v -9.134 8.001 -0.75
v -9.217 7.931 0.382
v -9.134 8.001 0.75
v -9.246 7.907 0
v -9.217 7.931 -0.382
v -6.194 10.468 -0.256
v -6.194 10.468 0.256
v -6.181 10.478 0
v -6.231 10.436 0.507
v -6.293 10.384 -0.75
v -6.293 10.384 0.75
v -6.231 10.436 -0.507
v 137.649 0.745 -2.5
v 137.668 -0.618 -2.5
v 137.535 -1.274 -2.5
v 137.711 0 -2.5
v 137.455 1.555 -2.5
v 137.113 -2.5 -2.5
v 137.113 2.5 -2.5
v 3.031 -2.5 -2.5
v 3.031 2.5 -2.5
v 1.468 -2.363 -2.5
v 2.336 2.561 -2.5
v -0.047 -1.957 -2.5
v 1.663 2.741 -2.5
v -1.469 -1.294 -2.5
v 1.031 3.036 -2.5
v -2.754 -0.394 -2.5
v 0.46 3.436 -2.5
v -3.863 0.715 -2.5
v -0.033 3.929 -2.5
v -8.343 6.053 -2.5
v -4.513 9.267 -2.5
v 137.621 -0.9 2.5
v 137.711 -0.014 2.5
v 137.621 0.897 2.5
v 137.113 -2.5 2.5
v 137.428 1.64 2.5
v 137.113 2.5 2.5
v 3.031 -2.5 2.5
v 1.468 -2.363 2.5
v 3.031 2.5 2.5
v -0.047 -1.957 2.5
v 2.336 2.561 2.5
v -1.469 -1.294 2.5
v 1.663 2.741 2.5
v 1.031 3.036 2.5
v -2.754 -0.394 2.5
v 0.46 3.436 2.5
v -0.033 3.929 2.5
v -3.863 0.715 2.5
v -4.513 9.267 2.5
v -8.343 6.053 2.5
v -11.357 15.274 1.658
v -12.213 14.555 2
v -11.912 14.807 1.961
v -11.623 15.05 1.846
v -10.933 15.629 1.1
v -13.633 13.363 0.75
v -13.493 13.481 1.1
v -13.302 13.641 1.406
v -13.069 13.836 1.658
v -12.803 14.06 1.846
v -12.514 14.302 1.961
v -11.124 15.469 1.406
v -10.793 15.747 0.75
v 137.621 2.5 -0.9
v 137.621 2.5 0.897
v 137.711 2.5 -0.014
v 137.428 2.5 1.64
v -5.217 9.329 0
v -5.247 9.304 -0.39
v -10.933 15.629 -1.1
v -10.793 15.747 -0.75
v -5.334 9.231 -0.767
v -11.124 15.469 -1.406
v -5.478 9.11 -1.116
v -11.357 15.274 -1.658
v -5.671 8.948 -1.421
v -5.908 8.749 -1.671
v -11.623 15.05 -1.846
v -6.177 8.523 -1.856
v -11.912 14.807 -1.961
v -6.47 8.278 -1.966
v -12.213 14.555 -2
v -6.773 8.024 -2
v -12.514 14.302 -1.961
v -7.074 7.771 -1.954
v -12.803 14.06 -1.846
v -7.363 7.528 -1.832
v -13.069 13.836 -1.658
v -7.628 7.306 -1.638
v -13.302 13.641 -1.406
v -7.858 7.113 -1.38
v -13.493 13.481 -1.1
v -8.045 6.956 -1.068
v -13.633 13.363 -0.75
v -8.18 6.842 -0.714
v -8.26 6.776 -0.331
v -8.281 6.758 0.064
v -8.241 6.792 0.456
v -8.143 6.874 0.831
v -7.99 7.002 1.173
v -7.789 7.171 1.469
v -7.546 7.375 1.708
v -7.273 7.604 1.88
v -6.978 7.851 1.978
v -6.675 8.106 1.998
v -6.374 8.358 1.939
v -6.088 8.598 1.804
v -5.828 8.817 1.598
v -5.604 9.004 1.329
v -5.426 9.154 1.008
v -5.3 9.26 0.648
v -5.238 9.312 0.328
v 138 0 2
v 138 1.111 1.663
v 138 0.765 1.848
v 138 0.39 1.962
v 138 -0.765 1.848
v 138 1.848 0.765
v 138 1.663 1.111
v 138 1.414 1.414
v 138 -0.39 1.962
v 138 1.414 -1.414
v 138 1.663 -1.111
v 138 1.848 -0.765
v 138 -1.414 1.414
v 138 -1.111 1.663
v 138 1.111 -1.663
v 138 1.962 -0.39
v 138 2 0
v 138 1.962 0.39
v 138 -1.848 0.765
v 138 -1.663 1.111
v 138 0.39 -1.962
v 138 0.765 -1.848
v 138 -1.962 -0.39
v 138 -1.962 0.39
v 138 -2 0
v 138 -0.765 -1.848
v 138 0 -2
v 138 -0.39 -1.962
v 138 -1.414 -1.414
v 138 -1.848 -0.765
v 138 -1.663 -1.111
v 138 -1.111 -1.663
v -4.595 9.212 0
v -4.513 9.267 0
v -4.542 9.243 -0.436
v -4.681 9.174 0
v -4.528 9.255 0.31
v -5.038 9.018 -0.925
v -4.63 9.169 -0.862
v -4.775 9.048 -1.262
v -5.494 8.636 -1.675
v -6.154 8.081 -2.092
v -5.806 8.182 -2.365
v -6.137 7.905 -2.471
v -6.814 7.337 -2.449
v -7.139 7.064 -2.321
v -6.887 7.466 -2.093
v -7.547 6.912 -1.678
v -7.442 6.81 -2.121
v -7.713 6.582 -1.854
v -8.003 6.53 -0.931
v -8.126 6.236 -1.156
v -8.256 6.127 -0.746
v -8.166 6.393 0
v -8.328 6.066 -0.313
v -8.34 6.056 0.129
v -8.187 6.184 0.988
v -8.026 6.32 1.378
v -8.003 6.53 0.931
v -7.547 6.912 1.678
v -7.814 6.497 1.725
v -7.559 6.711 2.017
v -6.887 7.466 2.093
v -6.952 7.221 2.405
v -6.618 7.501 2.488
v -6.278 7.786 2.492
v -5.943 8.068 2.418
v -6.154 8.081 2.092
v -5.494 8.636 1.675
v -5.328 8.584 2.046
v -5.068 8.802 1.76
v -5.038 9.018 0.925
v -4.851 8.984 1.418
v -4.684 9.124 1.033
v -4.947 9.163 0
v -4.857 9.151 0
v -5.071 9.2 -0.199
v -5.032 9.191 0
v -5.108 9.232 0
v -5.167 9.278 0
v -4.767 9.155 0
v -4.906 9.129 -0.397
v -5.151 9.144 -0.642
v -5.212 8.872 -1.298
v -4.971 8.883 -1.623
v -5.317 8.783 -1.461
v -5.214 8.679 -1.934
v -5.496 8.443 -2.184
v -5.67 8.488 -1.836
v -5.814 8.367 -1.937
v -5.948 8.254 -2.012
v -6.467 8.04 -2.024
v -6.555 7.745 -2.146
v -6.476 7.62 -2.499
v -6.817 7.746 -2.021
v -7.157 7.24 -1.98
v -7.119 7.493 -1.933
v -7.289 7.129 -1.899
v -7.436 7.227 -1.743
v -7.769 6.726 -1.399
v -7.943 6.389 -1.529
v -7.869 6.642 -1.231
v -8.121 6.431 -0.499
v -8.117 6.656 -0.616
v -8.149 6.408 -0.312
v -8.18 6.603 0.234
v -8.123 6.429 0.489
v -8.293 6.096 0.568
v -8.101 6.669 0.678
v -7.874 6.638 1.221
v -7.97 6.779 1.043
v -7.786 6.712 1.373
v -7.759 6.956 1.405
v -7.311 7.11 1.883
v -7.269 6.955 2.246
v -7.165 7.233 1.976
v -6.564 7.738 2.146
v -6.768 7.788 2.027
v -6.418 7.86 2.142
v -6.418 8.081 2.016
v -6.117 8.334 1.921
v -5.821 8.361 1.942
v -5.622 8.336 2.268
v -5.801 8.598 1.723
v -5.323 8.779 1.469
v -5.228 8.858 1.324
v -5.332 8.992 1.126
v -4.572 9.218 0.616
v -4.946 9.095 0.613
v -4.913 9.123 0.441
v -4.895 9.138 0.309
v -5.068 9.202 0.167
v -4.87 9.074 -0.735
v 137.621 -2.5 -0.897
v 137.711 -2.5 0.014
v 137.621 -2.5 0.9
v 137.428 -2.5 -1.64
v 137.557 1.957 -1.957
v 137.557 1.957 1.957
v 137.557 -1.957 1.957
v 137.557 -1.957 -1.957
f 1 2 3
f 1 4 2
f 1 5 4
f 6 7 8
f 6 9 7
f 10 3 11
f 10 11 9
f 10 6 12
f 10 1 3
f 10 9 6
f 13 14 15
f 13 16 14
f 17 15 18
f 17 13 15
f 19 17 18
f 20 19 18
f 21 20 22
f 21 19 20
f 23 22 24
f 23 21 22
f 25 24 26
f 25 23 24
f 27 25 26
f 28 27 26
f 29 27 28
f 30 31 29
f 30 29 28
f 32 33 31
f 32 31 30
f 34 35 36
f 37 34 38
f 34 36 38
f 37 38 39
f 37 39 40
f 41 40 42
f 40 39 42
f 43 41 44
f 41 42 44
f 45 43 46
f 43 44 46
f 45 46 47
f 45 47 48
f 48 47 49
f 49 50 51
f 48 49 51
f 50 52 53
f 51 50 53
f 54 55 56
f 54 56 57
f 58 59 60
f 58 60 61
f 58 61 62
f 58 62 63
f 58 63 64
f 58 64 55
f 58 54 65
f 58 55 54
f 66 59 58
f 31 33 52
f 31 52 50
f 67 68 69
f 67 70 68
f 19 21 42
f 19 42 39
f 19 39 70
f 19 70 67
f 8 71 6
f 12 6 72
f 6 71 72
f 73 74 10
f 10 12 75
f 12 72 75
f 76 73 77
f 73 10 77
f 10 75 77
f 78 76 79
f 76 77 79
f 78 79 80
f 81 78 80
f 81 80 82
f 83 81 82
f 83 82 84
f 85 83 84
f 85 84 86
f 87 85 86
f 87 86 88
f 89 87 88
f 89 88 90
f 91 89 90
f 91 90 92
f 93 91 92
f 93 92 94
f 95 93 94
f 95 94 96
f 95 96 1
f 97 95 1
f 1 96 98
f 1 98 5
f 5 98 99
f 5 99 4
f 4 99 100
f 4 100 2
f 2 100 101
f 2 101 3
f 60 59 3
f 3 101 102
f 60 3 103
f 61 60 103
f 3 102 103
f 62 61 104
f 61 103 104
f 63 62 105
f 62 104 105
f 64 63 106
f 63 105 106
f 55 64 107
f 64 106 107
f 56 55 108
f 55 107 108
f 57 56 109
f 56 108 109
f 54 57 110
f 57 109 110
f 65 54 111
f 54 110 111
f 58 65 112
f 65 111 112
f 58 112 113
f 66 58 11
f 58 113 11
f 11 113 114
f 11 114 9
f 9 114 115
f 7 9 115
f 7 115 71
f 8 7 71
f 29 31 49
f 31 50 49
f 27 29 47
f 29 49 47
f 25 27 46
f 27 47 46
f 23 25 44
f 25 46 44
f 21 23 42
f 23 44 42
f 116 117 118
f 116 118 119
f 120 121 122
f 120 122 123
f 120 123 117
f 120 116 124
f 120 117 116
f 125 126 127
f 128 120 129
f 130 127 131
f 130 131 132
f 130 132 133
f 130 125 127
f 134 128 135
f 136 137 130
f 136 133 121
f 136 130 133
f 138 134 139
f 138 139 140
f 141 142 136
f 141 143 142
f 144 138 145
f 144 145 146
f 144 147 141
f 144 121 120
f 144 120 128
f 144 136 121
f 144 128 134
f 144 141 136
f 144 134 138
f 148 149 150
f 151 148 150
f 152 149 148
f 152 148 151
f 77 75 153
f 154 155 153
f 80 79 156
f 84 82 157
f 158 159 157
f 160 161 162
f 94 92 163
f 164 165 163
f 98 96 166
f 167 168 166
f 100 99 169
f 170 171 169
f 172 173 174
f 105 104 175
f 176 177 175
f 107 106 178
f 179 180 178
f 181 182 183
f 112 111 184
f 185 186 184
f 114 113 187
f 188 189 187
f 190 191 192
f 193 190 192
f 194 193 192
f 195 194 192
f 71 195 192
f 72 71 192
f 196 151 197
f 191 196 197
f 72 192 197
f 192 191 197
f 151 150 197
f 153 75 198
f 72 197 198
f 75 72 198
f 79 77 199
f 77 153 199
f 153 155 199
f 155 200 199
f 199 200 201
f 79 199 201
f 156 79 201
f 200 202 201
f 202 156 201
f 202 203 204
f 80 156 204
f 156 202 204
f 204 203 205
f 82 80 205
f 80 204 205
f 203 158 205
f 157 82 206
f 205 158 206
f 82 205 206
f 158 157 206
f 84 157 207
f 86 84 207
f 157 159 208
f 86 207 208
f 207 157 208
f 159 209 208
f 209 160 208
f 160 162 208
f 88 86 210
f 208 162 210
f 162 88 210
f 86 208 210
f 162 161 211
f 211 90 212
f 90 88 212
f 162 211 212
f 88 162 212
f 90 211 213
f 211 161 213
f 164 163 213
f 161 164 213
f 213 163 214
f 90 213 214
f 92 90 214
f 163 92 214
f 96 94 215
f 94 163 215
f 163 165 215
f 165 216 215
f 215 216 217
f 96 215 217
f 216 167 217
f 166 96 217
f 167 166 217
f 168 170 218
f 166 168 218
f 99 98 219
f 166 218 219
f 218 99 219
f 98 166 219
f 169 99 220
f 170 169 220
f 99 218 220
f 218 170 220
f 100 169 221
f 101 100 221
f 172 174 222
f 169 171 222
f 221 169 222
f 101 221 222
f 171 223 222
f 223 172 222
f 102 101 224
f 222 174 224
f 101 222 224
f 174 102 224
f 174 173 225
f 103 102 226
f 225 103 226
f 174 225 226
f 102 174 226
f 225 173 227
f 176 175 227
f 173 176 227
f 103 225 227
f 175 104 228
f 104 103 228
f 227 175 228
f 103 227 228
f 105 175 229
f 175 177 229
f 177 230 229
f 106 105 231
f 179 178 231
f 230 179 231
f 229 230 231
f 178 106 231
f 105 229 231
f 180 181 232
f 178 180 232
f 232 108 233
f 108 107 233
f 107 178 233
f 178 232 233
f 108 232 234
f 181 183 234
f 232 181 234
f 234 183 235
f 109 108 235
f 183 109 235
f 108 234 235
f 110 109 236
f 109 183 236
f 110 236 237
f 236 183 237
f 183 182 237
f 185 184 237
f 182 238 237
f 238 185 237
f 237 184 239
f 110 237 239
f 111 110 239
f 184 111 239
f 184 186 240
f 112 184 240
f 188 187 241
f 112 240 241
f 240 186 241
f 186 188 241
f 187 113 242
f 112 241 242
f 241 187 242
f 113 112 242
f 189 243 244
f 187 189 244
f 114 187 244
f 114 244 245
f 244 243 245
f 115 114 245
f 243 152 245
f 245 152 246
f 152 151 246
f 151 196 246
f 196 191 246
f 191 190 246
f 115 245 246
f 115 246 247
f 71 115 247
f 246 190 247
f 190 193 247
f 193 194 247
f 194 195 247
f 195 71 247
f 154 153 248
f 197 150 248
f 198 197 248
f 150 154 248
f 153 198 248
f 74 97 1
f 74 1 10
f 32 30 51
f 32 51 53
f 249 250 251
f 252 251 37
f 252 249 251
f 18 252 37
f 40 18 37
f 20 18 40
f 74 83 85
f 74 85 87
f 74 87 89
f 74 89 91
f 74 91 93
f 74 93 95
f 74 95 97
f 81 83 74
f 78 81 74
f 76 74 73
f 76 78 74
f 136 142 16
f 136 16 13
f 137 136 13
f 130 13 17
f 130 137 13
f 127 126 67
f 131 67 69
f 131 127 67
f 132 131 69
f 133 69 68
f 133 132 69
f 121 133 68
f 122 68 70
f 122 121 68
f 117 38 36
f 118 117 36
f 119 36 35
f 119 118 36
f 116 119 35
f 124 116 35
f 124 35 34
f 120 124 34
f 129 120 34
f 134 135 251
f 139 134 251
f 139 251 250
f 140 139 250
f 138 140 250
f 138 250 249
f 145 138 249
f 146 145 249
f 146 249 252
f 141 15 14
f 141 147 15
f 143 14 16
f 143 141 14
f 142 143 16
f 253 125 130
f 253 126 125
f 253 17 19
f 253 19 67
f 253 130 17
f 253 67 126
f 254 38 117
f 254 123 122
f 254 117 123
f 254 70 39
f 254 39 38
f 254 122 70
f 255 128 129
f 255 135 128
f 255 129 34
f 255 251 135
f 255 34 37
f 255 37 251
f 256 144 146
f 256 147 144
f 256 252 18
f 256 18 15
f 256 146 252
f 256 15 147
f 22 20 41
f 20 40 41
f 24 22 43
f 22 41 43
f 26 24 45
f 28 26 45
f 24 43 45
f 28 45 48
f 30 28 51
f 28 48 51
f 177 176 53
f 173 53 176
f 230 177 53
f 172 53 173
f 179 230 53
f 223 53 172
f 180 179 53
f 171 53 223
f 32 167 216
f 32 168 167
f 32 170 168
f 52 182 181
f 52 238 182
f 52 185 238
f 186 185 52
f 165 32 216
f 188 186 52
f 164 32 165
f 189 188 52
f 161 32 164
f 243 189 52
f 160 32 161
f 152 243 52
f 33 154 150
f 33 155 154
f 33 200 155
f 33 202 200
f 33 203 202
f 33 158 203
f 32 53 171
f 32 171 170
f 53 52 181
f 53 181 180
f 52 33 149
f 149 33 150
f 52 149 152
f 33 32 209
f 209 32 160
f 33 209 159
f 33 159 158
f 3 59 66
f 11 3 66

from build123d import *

# Parameters (mm, degrees)
EXTRUDE_1_DEPTH      = 2.5
EXTRUDE_1_DEPTH_BACK = 2.5
SKETCH_2_OUTSIDE_W   = 45.04
SKETCH_2_OUTSIDE_H   = 51.807
SKETCH_2_OUTSIDE_R   = 2
CUT_EXTRUDE_1_DEPTH  = 2.5
CUT_EXTRUDE_1_DRAFT  = -60
FILLET_2_R           = 4
FILLET_3_R           = 9
SKETCH_3_R           = 2
EXTRUDE_2_DEPTH      = 9
SKETCH_4_W           = 26.934408862
SKETCH_4_H           = 1.5
CUT_EXTRUDE_2_DEPTH  = 7
FILLET_4_R           = 0.5


with BuildPart() as part:
    # 草图1 → 凸台-拉伸1 (new, two sides: drawn at the far end of the back side and taken through both)
    with BuildSketch(Plane.XY.offset(-EXTRUDE_1_DEPTH_BACK)):
        Polygon((-1.165769145, -2.5), (-8.342987205, 6.053475407), (-4.512764989, 9.267413455), (1.165769145, 2.5), (138, 2.5), (138, -2.5), align=None)
    extrude(amount=EXTRUDE_1_DEPTH + EXTRUDE_1_DEPTH_BACK)


with BuildPart() as cut_extrude_1_tool:
    # 草图2 outside → 切除-拉伸1 (with draft: the straight prism first)
    with BuildSketch(Plane(origin=(138, 0, 0), x_dir=(0, 0, -1), z_dir=(1, 0, 0))):
        with Locations((0, 3.3835)):
            Rectangle(SKETCH_2_OUTSIDE_W, SKETCH_2_OUTSIDE_H)
        Circle(SKETCH_2_OUTSIDE_R, mode=Mode.SUBTRACT)
    extrude(amount=-CUT_EXTRUDE_1_DEPTH)
    # 切除-拉伸1: the draft: its side faces are tilted about the plane it starts from
    cut_extrude_1_sides = [cut_extrude_1_tool.faces().sort_by_distance(p)[0] for p in [
        (136.75, -22.52, 0),
        (136.75, 3.3835, -22.52),
        (136.75, 29.287, 0),
        (136.75, 3.3835, 22.52),
        (136.75, 0, 2),
    ]]
    draft(cut_extrude_1_sides, Plane(origin=(138, 0, 0), x_dir=(0, 0, -1), z_dir=(1, 0, 0)), CUT_EXTRUDE_1_DRAFT)


with BuildPart() as part_1:
    add(part.part)

    # 切除-拉伸1: cut by cut_extrude_1_tool
    add(cut_extrude_1_tool.part, mode=Mode.SUBTRACT)

    # 圆角2
    fillet_2_edges = [part_1.edges().sort_by_distance(p)[0] for p in [
        (1.165769145, 2.5, 0),
    ]]
    fillet(fillet_2_edges, radius=FILLET_2_R)

    # 圆角3
    fillet_3_edges = [part_1.edges().sort_by_distance(p)[0] for p in [
        (-1.165769145, -2.5, 0),
    ]]
    fillet(fillet_3_edges, radius=FILLET_3_R)

    # 草图3 → 凸台-拉伸2 (add)
    with BuildSketch(Plane(origin=(-6.427876097, 7.660444431, 0), x_dir=(0.7660444431189749, 0.6427876096865432, 0), z_dir=(-0.6427876096865431, 0.7660444431189748, 0))):
        Circle(SKETCH_3_R)
    extrude(amount=EXTRUDE_2_DEPTH)

    # 草图4 → 切除-拉伸2 (cut)
    with BuildSketch(Plane(origin=(-12.212964584, 14.554844419, 0), x_dir=(0.7660444431189747, 0.6427876096865435, 0), z_dir=(-0.6427876096865434, 0.7660444431189746, 0))):
        Rectangle(SKETCH_4_W, SKETCH_4_H)
    extrude(amount=-CUT_EXTRUDE_2_DEPTH, mode=Mode.SUBTRACT)

    # 圆角4
    fillet_4_edges = [part_1.edges().sort_by_distance(p)[0] for p in [
        (-7.959964983, 6.374869212, 0),
    ]]
    fillet(fillet_4_edges, radius=FILLET_4_R - 0.0001)  # a hair under: the kernel refuses the full size


solid = part_1.part
